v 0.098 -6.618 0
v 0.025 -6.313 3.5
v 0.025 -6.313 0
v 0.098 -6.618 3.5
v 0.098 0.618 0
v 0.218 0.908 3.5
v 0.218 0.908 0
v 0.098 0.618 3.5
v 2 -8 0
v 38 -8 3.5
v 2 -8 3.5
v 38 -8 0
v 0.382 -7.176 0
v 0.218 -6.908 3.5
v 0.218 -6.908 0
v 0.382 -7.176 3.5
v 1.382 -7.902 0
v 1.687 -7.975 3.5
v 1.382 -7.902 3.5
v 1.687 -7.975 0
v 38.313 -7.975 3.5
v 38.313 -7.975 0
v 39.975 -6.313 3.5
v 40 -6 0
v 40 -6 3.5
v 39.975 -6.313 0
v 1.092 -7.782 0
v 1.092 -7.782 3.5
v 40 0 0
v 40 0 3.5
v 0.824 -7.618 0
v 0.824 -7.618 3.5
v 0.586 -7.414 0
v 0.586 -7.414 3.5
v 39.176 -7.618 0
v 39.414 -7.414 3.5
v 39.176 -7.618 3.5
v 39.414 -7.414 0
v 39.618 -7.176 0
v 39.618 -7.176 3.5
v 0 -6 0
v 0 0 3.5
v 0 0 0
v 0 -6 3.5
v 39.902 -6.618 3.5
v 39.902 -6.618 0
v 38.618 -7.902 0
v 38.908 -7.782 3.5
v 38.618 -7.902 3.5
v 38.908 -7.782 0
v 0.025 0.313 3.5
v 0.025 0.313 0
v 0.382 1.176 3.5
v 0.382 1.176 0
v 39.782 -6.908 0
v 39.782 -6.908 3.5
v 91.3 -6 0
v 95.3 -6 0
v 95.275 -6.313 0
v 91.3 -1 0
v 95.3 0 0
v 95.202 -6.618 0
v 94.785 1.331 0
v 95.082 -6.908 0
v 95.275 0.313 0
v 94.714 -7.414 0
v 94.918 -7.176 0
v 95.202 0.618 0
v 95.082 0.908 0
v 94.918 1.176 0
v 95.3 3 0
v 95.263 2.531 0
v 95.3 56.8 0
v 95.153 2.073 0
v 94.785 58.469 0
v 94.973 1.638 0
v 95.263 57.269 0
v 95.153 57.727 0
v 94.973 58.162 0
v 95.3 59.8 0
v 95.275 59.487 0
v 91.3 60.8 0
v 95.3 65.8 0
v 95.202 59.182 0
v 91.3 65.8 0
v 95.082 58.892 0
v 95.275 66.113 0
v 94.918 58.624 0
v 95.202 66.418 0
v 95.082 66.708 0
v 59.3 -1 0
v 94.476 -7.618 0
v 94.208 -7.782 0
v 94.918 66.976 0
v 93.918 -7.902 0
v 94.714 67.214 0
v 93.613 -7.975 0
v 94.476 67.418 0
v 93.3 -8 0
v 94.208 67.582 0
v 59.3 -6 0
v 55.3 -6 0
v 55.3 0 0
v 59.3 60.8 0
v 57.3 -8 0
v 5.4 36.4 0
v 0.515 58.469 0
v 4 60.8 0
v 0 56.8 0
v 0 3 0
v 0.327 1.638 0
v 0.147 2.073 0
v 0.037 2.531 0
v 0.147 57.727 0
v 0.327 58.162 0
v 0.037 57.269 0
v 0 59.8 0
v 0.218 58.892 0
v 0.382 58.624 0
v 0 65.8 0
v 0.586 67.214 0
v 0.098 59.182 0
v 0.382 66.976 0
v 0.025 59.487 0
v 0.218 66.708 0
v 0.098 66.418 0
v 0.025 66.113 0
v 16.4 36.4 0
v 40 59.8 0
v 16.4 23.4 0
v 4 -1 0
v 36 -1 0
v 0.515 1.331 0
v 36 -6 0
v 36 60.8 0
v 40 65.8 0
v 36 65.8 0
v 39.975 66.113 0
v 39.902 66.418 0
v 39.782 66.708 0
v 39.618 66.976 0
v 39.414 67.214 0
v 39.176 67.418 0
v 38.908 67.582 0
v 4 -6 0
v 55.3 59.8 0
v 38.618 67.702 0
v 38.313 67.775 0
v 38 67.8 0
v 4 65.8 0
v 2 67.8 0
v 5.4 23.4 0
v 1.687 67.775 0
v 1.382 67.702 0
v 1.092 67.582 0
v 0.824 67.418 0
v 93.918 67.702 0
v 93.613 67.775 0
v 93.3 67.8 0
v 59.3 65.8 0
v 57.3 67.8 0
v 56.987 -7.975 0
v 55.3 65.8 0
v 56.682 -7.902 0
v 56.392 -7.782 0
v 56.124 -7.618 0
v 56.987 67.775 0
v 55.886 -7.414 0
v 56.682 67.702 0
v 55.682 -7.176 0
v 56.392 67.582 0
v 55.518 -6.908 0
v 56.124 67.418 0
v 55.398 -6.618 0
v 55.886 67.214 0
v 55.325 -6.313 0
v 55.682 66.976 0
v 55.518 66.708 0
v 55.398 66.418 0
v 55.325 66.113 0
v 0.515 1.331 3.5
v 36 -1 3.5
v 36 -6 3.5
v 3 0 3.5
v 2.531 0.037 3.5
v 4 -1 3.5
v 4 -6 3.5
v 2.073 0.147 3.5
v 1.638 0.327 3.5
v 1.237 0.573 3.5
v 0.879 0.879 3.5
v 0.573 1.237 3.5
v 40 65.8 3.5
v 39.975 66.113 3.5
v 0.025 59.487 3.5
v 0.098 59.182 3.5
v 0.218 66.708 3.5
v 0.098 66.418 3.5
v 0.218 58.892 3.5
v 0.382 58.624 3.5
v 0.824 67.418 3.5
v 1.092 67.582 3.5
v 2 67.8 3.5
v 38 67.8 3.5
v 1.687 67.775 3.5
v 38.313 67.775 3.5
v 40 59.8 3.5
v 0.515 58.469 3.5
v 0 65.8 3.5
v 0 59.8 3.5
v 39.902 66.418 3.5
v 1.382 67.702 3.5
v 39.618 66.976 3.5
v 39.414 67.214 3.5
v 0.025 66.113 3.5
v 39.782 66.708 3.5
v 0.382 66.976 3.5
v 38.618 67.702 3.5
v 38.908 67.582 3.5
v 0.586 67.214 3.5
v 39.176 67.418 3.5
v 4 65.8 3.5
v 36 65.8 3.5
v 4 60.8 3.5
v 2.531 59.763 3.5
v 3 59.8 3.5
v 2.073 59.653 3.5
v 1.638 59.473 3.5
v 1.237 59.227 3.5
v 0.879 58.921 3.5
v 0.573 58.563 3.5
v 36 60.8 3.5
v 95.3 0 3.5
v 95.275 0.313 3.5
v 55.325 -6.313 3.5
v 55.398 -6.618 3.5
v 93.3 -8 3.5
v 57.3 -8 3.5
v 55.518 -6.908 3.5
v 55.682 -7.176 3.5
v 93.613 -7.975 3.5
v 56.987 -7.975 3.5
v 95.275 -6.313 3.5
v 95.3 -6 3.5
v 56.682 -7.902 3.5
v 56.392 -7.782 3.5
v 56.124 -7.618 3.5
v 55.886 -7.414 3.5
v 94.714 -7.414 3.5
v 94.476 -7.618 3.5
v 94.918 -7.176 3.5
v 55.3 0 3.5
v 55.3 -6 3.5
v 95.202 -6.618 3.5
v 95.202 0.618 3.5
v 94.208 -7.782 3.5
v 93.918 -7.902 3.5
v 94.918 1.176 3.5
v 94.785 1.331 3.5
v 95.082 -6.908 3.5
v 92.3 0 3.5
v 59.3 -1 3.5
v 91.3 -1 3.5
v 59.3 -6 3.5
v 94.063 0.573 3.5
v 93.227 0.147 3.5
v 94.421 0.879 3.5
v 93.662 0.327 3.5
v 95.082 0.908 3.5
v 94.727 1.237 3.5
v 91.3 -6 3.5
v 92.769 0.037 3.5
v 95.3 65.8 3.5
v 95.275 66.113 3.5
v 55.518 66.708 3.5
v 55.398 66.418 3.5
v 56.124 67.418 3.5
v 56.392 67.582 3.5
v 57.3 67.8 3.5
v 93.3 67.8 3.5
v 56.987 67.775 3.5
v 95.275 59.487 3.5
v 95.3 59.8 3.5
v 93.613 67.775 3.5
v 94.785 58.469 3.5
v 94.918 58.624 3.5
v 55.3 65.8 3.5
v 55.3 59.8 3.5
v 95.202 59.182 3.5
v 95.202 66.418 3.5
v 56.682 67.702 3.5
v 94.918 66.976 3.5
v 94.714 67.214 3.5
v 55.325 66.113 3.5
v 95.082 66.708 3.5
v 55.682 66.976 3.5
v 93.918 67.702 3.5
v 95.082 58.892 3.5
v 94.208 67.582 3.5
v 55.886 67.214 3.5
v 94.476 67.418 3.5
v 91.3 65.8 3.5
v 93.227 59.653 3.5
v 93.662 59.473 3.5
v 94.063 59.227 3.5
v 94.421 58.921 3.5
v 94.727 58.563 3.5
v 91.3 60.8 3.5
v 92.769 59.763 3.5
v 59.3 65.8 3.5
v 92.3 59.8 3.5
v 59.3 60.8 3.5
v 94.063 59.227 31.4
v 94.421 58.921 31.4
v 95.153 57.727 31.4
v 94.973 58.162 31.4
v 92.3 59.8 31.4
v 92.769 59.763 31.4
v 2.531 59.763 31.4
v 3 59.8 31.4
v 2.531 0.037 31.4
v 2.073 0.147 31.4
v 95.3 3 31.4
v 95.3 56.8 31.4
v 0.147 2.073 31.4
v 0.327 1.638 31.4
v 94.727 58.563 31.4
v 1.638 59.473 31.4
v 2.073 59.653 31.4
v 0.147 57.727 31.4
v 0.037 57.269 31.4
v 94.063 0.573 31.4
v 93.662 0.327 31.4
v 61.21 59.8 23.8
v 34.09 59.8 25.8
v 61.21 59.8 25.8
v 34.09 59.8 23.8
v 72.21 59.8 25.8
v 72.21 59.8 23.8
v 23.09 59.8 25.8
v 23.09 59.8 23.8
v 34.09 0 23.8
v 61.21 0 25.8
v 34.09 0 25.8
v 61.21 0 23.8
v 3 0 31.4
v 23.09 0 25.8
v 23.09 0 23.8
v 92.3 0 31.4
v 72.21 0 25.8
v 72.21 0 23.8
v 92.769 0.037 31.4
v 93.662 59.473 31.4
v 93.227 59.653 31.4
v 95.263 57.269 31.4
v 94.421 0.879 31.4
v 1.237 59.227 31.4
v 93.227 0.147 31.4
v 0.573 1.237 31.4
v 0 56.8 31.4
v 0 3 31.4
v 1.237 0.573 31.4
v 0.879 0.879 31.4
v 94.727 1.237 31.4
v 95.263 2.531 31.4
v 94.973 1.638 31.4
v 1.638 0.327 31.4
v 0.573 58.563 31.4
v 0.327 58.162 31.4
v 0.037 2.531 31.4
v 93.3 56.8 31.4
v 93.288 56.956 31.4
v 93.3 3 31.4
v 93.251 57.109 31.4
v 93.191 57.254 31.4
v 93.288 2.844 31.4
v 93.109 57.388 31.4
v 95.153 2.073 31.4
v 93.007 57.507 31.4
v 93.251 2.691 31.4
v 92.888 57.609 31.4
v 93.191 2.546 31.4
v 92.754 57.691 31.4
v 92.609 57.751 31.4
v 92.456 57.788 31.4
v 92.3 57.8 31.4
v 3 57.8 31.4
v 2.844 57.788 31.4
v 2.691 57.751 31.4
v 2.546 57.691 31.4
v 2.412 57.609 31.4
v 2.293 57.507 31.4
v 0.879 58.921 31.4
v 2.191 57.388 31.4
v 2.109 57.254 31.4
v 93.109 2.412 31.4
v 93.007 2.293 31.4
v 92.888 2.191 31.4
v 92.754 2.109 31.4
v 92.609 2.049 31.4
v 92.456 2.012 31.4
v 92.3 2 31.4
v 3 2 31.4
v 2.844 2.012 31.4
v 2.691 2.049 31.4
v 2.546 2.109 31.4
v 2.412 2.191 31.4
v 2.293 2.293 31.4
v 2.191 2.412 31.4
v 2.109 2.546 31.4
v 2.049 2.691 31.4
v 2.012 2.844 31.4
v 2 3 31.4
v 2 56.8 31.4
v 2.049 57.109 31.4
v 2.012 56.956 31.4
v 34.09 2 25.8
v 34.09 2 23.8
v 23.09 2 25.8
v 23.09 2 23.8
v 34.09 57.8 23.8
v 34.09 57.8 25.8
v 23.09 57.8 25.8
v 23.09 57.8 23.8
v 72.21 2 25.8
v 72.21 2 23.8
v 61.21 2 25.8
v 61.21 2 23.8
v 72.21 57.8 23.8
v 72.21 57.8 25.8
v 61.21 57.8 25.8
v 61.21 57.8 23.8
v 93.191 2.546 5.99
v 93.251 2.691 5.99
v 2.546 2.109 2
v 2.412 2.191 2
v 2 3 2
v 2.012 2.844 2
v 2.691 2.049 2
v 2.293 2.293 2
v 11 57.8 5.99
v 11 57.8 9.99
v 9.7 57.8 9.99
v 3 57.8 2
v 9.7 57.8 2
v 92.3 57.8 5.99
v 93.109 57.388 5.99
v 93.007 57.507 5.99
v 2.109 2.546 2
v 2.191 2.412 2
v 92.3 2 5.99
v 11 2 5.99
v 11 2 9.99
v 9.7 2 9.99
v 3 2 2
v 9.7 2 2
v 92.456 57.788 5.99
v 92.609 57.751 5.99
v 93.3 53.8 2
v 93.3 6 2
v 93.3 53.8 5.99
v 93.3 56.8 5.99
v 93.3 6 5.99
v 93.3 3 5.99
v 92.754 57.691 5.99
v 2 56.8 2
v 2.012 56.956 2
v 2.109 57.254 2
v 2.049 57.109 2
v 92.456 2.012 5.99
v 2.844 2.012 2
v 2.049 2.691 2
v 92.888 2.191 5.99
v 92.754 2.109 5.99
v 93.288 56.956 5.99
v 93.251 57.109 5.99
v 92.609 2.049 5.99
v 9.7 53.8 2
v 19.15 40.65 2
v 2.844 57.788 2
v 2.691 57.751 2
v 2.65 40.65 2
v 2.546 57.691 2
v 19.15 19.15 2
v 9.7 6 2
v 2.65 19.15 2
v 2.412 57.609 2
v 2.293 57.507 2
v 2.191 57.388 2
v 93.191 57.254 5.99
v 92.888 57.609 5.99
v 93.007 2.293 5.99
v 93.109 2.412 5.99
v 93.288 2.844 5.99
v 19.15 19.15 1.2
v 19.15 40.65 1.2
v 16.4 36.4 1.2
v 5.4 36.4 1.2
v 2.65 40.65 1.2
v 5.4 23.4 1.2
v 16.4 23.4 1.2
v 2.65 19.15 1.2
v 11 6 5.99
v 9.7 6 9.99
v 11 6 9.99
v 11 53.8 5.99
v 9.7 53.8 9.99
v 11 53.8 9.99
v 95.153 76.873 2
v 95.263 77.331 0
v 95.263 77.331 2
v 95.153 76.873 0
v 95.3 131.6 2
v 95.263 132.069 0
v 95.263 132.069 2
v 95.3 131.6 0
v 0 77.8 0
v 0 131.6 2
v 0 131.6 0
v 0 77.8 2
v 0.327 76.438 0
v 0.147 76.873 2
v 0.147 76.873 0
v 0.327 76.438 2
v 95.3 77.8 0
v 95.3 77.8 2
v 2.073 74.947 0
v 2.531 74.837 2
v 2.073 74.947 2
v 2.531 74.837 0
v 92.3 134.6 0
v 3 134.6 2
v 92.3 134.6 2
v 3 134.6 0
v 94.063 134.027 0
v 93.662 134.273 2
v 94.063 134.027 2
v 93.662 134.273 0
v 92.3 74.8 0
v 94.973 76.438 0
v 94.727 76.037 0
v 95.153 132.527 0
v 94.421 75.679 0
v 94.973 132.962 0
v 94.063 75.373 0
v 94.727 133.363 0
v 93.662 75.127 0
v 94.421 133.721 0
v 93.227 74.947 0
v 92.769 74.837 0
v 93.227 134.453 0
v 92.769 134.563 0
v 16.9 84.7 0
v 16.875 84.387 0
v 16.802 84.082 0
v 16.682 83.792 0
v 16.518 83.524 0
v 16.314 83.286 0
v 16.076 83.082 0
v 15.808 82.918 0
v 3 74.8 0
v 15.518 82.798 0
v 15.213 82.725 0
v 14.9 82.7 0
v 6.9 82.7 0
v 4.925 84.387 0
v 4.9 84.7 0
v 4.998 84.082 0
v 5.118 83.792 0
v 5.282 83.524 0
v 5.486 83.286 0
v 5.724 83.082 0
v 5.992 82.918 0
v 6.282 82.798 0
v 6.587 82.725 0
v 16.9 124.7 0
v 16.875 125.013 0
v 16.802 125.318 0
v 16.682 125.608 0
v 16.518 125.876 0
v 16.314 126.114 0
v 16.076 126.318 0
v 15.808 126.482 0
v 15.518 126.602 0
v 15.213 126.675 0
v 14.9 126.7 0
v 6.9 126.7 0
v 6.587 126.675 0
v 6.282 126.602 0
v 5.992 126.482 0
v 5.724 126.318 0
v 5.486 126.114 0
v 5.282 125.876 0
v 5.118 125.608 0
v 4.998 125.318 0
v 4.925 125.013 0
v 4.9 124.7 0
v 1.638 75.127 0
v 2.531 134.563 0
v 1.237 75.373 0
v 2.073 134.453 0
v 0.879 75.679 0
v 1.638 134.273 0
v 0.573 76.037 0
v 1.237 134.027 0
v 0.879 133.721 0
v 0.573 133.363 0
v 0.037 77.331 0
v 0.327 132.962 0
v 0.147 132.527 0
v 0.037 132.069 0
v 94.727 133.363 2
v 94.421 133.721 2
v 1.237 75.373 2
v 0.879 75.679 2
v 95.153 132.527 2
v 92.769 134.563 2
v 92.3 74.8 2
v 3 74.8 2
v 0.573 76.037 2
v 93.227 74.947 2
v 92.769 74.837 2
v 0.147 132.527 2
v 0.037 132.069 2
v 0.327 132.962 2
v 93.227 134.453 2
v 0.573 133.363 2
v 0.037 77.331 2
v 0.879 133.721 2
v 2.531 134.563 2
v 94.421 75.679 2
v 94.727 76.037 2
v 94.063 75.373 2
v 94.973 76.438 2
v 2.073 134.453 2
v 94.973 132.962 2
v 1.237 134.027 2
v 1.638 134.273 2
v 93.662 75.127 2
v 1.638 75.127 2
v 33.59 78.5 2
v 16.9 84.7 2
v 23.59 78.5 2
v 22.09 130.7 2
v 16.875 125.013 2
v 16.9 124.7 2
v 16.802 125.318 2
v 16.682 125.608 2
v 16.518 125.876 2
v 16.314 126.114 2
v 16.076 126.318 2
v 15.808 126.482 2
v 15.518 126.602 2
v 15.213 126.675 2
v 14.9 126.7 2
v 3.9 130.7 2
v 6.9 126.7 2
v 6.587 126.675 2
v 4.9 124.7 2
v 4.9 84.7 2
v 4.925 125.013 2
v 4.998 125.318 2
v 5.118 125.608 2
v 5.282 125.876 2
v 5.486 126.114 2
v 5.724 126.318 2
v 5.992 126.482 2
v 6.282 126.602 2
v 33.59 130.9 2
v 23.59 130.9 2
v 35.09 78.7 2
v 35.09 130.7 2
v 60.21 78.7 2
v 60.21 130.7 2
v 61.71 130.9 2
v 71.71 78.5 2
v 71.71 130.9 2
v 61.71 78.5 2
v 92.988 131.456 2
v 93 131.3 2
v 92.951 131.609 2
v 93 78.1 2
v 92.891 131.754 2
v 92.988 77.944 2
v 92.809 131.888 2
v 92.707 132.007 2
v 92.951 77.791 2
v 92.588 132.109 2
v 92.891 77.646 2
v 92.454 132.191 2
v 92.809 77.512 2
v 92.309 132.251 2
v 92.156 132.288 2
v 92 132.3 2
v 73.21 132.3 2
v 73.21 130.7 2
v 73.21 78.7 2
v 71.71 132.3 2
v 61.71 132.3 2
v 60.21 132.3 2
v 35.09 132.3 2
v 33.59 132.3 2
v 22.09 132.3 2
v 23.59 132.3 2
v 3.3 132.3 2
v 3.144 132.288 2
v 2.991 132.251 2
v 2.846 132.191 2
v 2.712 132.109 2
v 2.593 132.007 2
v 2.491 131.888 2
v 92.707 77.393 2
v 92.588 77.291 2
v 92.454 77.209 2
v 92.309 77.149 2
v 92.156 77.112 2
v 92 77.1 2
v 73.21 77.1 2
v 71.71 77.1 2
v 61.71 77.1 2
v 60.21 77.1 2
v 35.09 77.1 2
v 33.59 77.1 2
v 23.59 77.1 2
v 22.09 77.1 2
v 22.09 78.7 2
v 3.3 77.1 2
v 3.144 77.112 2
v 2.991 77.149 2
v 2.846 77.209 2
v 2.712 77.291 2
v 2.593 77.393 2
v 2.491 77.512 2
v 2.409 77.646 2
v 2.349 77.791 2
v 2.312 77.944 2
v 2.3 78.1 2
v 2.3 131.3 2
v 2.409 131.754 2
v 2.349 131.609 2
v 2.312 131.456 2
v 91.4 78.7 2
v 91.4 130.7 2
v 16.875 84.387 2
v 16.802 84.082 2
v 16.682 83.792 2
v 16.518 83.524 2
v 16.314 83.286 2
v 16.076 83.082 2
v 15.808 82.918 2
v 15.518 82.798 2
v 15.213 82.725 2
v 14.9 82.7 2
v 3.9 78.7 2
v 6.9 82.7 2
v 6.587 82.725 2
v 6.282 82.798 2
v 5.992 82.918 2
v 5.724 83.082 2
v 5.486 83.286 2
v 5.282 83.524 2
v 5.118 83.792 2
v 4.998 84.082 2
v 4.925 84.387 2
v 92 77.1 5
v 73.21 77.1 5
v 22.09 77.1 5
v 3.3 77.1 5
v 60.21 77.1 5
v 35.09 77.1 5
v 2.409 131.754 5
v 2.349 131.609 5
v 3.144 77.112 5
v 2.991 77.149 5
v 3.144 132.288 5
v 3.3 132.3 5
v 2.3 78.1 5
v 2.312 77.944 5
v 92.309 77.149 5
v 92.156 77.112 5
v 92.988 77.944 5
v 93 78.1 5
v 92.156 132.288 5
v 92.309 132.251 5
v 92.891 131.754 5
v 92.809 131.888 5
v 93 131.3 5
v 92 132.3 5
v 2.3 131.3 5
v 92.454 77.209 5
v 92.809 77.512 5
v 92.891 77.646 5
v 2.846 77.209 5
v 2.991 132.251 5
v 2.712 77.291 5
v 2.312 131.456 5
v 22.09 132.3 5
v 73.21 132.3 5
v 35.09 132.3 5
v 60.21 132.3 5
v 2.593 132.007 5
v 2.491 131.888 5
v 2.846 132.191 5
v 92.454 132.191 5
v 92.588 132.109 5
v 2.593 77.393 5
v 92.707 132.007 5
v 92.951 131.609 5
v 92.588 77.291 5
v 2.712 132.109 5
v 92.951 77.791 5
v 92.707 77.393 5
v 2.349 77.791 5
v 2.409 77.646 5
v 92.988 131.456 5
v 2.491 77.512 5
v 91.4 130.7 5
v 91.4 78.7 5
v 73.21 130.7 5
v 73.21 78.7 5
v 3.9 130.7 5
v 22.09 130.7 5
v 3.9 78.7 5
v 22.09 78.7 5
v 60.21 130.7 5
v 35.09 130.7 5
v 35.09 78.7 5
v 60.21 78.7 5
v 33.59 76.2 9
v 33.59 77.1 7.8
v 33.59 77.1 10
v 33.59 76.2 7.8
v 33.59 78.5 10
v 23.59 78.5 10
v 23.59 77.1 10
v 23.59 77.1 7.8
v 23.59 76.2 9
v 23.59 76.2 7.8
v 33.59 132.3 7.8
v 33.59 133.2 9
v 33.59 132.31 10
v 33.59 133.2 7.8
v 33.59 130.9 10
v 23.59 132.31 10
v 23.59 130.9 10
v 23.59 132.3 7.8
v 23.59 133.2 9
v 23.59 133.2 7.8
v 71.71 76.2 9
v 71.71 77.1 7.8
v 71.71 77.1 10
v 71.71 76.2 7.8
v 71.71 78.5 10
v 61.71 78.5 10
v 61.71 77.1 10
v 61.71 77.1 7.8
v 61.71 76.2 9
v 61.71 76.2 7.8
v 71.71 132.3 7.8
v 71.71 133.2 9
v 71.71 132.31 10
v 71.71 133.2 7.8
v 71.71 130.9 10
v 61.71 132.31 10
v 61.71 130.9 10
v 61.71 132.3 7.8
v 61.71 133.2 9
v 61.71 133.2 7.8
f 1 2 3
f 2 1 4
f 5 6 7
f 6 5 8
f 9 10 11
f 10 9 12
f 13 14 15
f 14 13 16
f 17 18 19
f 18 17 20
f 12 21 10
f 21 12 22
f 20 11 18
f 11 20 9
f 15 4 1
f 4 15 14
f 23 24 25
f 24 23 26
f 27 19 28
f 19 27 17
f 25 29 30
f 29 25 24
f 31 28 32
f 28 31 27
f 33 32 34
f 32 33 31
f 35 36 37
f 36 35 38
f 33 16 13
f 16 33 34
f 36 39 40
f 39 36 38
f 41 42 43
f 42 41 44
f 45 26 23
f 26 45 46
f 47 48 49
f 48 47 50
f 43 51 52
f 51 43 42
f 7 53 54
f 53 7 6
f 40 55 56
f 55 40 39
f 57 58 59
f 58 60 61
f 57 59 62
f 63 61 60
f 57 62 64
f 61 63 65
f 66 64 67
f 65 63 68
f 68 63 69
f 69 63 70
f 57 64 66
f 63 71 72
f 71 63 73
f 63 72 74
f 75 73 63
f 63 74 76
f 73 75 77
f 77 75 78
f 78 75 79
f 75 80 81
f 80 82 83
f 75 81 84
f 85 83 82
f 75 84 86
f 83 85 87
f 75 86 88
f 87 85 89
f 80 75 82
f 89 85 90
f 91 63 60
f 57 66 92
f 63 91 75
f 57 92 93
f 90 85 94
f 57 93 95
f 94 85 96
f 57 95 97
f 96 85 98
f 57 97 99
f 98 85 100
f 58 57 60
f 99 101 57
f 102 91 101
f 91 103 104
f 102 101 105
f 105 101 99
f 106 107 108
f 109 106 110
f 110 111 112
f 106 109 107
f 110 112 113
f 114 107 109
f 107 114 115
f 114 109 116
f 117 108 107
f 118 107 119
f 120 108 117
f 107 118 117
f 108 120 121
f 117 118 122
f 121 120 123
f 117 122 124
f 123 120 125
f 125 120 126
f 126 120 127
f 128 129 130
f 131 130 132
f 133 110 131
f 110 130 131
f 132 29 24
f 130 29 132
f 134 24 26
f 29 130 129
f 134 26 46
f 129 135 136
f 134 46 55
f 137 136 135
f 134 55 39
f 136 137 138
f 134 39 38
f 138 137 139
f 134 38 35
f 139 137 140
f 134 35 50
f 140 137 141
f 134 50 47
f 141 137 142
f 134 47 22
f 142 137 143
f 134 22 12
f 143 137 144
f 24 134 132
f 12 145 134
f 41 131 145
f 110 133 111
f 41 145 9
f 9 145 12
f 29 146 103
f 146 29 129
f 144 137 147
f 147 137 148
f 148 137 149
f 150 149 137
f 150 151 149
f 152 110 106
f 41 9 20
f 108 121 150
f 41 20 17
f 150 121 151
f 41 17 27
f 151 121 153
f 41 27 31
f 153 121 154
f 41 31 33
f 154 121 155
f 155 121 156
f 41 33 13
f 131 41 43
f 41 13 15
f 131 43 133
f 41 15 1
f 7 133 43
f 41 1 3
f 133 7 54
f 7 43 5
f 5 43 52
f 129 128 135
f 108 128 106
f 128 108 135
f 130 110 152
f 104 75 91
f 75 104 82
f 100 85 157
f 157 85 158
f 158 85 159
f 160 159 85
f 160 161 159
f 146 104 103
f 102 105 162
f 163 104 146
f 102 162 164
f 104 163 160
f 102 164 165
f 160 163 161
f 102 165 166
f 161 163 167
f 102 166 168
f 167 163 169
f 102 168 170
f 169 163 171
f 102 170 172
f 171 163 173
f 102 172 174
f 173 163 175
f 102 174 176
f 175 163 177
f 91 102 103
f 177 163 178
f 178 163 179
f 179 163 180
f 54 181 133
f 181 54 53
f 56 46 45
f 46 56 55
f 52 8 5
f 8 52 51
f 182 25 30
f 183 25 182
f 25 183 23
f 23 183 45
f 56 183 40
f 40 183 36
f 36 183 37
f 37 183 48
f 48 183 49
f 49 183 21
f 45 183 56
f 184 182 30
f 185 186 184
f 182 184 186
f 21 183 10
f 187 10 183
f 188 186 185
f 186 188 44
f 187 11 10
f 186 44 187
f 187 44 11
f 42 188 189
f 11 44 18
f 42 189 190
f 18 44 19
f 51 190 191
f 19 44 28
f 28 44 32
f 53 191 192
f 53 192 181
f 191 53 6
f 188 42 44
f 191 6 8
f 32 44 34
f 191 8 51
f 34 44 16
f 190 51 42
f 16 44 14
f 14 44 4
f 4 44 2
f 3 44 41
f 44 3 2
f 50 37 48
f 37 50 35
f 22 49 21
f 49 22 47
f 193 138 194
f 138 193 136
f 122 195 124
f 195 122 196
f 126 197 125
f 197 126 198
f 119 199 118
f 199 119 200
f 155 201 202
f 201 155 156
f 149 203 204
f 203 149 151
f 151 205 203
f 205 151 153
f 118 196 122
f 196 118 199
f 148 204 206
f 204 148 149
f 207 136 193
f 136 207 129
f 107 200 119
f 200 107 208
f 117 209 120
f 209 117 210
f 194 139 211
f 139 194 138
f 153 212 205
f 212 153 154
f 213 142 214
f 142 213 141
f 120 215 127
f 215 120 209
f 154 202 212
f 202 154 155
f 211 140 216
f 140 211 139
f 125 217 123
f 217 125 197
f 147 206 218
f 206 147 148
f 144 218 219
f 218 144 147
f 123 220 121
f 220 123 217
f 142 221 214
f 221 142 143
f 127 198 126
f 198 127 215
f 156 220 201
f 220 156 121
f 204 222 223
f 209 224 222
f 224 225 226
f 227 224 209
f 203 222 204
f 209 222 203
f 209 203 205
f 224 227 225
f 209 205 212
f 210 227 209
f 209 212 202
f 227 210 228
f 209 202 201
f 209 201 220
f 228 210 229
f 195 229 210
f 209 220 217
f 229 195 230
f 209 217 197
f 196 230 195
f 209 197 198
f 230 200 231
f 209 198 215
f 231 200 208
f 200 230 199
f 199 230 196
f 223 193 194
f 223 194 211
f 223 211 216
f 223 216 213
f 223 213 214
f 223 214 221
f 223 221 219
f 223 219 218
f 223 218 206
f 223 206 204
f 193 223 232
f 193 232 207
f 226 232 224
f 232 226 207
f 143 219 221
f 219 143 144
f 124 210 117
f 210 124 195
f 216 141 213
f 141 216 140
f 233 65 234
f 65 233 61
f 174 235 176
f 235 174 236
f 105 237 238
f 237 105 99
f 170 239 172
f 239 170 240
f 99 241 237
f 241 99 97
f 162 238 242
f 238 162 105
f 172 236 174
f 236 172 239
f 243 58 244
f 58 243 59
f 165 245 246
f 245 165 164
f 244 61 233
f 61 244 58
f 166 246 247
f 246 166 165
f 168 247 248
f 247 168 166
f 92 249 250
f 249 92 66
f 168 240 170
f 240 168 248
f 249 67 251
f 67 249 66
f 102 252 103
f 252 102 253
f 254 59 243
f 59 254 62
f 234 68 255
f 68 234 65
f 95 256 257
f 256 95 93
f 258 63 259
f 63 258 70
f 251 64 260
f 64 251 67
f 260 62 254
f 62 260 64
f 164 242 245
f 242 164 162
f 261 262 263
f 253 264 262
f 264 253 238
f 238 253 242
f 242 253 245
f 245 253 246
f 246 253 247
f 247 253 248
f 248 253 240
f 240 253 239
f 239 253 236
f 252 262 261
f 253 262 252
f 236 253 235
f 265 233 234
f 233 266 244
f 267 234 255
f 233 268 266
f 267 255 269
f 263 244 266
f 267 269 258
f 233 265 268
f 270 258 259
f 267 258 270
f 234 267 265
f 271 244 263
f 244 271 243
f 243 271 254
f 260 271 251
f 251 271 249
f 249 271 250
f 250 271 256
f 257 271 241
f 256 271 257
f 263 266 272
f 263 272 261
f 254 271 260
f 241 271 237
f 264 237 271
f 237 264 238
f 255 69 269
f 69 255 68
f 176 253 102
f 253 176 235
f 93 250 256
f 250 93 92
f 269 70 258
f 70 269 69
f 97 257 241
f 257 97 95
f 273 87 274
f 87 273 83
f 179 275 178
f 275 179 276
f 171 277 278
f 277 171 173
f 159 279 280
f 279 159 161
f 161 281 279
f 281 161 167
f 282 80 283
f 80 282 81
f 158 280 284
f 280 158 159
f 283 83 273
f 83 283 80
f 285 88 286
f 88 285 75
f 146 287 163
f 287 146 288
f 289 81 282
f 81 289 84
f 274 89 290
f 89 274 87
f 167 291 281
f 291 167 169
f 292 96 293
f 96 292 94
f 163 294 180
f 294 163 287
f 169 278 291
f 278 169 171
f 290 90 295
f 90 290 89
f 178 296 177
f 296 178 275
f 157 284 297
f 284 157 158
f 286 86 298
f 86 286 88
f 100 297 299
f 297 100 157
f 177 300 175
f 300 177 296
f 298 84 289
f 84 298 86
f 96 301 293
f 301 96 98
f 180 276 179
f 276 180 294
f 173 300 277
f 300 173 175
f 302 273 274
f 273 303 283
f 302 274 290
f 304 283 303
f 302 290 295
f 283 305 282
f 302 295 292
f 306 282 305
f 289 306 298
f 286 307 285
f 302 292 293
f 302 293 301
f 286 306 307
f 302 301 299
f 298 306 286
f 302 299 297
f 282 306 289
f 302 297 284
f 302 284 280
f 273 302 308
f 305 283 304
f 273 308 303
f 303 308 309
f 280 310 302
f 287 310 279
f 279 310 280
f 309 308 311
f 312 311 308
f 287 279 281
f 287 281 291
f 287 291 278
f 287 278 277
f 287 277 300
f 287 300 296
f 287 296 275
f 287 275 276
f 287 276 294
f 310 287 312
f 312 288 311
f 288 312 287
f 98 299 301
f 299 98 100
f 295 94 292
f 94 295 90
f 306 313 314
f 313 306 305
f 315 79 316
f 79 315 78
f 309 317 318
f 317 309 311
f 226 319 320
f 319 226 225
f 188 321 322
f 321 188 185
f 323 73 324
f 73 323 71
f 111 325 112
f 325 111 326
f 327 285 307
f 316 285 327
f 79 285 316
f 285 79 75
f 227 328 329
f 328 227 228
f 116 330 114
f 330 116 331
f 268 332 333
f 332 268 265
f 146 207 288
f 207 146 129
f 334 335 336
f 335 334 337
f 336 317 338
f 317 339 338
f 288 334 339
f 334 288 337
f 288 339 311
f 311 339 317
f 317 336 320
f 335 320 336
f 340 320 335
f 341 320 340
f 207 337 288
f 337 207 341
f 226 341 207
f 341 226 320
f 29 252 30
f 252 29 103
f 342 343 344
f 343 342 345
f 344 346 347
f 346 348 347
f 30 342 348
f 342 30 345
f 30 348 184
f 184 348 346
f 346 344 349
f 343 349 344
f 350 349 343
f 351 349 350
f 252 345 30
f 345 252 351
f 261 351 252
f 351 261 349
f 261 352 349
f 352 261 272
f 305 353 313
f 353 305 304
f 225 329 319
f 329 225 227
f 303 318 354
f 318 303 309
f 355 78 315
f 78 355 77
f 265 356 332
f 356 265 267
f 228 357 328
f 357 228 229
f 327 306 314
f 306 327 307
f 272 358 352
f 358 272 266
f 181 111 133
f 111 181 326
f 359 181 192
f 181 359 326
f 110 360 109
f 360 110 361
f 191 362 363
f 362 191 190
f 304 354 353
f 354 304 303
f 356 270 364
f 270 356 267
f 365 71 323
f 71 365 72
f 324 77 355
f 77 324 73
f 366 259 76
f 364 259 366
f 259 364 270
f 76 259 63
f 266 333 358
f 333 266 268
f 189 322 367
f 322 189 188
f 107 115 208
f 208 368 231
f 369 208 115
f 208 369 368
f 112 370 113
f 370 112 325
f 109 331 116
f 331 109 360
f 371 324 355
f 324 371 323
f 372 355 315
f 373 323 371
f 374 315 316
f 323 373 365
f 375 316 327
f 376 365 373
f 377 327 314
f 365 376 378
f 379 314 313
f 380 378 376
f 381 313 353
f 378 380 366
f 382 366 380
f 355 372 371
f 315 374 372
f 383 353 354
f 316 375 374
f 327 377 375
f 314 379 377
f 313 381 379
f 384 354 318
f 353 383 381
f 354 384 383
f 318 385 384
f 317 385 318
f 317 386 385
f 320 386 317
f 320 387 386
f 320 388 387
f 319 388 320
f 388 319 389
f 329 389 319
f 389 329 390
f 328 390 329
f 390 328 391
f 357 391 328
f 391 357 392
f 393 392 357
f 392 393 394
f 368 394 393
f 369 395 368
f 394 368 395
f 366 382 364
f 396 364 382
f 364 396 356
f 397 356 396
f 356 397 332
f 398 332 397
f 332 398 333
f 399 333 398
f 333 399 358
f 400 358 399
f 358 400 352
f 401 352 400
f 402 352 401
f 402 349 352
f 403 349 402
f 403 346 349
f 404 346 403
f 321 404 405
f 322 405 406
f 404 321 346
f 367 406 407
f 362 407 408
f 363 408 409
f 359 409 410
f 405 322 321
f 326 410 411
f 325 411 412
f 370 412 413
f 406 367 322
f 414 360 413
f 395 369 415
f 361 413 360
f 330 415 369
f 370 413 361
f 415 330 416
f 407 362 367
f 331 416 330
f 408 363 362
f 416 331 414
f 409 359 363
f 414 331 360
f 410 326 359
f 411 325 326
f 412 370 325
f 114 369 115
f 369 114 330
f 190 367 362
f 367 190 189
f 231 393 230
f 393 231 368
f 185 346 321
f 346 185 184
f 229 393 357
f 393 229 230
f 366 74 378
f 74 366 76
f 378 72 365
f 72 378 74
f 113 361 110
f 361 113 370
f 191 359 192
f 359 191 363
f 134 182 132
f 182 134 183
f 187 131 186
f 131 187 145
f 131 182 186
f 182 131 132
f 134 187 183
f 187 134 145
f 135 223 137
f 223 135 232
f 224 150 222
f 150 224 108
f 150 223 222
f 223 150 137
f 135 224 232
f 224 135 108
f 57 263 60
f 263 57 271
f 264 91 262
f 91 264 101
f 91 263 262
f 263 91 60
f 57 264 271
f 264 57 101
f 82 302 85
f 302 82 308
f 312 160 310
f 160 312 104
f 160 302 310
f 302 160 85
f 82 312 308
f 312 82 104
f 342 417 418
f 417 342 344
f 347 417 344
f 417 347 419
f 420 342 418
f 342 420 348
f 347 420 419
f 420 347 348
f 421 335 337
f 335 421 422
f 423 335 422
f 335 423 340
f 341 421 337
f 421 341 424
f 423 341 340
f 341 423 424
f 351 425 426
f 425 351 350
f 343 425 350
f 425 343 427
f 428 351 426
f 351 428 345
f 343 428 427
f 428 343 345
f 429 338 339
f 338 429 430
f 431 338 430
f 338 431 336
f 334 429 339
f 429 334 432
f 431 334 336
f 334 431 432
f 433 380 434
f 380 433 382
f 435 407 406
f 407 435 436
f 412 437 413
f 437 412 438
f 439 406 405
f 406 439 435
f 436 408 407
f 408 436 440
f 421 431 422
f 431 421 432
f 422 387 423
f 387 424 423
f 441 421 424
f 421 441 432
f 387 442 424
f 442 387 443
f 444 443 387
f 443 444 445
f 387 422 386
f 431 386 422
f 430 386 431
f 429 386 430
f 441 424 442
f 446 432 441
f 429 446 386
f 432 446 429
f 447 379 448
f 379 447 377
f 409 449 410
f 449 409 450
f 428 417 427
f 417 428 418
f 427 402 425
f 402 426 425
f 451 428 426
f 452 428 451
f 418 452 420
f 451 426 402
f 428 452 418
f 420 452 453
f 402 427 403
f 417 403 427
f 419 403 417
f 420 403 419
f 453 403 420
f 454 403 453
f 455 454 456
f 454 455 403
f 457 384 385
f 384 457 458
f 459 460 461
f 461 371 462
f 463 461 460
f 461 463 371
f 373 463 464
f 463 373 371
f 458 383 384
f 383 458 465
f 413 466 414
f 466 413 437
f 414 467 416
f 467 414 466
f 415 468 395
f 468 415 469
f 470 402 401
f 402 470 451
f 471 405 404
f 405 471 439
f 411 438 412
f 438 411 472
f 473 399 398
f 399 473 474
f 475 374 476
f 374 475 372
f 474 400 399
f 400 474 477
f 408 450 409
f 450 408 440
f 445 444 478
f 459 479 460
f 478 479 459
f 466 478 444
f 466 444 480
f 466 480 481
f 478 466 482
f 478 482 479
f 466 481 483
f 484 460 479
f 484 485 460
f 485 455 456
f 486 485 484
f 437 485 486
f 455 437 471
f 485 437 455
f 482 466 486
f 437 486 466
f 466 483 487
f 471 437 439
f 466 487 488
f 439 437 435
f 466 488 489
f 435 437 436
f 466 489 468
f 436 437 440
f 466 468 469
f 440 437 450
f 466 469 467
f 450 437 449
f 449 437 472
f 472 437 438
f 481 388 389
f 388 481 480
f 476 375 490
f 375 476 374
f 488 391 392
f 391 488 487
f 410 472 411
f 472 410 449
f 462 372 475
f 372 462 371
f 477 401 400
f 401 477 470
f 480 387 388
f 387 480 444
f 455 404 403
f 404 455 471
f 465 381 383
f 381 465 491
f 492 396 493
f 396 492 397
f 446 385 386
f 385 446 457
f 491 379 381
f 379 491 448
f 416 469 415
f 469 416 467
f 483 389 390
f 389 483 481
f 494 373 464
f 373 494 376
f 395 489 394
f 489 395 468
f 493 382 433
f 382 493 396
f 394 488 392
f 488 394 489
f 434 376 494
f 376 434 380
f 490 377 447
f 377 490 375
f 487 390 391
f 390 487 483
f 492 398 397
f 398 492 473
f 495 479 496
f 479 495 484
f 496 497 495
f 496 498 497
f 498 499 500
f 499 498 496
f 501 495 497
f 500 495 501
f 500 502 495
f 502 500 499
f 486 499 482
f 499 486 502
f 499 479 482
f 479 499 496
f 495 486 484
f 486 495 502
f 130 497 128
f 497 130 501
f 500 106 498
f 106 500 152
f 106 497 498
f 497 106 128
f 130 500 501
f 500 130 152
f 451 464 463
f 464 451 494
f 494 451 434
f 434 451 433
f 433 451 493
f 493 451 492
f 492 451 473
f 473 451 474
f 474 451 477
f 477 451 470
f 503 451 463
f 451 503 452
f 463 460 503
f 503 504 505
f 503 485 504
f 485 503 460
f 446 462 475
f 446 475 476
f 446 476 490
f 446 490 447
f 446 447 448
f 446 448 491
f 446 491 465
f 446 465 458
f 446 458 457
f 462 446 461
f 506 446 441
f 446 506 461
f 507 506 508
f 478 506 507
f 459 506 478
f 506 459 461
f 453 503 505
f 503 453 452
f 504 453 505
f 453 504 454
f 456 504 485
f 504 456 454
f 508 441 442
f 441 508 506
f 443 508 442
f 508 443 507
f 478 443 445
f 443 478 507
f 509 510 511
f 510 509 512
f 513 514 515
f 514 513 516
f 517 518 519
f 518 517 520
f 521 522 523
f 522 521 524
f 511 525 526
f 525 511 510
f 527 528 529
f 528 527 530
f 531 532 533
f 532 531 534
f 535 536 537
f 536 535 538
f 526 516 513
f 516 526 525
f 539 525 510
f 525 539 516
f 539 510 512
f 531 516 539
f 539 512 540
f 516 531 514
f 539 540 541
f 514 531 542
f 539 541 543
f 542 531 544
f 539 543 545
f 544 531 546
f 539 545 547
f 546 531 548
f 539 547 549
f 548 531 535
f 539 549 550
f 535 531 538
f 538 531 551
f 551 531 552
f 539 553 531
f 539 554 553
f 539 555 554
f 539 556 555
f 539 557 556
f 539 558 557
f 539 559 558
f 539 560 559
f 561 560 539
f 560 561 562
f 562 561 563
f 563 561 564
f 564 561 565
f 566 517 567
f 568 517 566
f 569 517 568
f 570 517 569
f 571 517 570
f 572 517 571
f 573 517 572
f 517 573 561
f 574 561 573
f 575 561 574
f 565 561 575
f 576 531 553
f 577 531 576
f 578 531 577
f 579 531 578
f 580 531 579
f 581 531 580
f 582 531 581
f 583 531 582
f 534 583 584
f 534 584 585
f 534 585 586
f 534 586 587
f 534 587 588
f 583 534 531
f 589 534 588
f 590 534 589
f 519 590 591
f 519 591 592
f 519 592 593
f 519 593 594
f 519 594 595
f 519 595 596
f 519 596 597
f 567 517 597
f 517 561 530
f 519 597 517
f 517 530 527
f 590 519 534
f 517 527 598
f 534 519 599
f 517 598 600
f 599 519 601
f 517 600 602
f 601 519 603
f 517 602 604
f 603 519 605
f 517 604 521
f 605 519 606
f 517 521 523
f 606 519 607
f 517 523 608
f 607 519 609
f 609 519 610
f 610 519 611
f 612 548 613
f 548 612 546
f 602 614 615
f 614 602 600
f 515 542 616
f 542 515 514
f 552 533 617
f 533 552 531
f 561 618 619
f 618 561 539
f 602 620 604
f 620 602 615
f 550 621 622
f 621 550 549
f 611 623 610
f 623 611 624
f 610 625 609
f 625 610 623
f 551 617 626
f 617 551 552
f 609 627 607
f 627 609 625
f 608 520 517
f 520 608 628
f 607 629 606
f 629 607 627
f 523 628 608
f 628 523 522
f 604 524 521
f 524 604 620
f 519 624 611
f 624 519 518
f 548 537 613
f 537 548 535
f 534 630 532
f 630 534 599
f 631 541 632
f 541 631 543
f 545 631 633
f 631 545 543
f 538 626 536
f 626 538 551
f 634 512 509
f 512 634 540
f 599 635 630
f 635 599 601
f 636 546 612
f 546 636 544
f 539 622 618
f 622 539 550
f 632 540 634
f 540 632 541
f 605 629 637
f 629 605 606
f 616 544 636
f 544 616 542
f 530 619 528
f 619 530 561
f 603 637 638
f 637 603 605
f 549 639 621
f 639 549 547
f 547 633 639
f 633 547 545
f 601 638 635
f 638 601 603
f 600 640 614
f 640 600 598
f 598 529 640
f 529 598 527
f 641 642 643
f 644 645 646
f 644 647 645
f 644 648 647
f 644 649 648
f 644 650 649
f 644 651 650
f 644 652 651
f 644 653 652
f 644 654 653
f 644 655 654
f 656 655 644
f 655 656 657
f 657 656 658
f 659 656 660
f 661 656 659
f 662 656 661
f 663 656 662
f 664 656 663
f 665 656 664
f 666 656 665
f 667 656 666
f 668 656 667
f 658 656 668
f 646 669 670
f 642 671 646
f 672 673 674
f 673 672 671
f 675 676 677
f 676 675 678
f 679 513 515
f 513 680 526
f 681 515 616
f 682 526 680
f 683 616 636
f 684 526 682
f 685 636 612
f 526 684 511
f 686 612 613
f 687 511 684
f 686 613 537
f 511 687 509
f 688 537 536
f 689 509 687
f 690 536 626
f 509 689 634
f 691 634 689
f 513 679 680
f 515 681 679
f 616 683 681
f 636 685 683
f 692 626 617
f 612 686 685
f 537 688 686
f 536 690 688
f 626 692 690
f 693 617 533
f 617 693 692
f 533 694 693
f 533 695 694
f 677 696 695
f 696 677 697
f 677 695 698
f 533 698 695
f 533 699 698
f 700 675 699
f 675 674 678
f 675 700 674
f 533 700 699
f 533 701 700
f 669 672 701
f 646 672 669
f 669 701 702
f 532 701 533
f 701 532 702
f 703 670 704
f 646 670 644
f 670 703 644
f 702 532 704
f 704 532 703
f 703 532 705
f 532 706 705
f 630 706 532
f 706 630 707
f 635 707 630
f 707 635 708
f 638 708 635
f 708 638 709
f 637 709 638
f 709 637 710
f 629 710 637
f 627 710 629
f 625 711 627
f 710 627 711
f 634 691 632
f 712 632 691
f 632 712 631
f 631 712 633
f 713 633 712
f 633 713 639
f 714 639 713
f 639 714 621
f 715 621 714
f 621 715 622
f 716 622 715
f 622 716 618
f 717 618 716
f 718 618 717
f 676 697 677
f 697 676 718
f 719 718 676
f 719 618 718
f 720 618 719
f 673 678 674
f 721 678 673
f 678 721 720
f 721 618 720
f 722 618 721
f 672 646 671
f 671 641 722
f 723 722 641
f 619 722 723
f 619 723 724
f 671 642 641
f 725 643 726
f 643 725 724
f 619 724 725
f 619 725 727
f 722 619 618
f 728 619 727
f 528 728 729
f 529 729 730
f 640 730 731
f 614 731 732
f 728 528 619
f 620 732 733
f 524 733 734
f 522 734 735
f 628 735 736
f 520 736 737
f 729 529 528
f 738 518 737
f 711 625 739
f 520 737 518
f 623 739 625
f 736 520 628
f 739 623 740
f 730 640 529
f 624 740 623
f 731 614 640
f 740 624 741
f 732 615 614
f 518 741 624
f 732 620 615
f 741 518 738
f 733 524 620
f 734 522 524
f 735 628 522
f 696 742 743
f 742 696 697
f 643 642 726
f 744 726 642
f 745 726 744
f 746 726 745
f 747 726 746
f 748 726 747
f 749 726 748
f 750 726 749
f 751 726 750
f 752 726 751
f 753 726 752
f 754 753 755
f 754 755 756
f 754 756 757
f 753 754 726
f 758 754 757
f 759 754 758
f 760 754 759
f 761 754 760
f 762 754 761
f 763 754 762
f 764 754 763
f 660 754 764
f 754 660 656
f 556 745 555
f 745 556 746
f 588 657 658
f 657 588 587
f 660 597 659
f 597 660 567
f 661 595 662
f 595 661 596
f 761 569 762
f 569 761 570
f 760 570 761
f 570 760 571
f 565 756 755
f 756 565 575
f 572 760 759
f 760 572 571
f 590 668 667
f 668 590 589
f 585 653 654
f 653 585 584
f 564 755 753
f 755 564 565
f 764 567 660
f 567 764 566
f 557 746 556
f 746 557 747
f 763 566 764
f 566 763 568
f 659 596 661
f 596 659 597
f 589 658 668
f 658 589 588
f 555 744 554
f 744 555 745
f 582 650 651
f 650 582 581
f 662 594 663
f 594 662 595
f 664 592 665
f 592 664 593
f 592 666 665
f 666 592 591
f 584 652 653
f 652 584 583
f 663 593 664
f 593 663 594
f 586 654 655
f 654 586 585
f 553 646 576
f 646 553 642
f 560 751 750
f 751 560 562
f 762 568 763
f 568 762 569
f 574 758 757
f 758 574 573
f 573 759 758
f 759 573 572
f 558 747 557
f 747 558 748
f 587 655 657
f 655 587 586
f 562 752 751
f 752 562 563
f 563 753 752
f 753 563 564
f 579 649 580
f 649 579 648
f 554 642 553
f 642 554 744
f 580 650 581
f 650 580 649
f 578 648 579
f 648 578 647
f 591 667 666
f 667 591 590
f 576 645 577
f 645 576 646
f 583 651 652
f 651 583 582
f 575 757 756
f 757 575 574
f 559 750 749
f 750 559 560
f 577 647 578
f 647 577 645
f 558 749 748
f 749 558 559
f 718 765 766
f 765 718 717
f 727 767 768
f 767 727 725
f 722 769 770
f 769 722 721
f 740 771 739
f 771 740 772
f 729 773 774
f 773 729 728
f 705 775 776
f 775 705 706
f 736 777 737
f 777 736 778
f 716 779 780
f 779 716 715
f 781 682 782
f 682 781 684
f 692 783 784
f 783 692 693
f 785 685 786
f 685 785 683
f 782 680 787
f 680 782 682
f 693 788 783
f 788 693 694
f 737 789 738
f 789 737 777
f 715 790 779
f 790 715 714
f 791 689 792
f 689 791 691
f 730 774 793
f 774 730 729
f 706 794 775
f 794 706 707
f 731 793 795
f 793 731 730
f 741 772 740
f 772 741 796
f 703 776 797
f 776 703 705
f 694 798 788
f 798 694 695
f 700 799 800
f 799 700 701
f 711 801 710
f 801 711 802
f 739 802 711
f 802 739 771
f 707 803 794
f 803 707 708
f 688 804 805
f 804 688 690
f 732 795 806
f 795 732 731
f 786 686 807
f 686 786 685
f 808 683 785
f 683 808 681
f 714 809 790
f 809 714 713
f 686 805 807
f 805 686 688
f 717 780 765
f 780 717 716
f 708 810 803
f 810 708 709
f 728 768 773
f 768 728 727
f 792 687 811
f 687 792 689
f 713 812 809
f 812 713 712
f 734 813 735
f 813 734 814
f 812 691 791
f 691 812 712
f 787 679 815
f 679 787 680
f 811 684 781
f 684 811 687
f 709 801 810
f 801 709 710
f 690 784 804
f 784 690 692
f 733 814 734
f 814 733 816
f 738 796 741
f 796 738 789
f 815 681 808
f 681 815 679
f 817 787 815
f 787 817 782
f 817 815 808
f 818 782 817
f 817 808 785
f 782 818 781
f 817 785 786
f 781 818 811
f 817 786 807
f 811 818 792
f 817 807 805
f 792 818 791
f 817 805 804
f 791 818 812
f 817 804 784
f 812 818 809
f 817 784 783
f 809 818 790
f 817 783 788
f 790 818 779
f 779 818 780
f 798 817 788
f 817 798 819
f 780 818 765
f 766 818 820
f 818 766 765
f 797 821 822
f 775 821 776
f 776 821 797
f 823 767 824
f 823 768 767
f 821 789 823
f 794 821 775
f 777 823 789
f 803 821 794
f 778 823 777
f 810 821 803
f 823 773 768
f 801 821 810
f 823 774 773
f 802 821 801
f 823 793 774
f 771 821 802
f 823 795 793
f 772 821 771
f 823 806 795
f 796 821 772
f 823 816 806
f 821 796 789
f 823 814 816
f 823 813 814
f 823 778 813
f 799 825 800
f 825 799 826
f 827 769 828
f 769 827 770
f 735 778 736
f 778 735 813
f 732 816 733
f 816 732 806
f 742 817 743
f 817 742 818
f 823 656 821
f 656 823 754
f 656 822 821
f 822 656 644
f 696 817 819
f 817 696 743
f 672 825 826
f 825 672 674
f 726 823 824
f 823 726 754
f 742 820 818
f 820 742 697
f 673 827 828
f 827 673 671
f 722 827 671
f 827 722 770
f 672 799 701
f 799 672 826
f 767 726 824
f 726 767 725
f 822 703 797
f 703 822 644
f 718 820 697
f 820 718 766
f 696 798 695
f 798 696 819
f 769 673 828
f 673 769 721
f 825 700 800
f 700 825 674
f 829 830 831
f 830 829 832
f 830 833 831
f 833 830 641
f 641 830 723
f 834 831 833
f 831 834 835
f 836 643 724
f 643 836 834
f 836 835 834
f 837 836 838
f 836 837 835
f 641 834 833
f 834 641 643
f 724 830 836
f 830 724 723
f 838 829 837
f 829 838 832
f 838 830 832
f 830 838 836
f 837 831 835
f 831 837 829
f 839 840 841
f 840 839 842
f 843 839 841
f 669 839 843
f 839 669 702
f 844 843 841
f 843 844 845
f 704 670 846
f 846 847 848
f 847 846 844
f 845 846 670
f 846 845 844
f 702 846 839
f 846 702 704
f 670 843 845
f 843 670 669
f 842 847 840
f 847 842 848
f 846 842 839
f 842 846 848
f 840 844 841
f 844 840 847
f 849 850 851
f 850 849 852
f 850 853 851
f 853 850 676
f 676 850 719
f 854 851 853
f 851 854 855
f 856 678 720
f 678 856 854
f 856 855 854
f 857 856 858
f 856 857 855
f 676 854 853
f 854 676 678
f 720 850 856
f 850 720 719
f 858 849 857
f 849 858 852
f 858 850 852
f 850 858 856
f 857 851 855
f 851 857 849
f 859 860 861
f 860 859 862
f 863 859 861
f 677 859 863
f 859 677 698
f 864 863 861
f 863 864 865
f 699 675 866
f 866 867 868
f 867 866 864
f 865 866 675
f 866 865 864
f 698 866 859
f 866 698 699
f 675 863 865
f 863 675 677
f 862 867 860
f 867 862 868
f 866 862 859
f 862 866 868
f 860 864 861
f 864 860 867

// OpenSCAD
// ECE198: simple strap-on box for the breadboard (ESP32 build, no battery inside).
// x = along the arm, y = across the arm, z = up.
part = "both";            // "box", "lid", "assembled", "both"

bb_l = 82; bb_w = 55; bb_h = 9;   // breadboard
headroom = 25.4;                  // inside height measured from the bottom of the breadboard (~1 inch)
led_win_l = 12; led_win_w = 44;  // big LED viewing window in the lid, over the wire-channel end
hr_l = 21; hr_w = 16;             // MAX30102 breakout, faces down through the floor
hr_win_l = 13; hr_win_w = 11;     // skin window under the sensor chip
rail_h = 4;                       // breadboard sits on rails so the sensor and its wires fit underneath
wire_gap = 8.5;                   // channel along one short end wall for the sensor wires (wide enough to centre the sensor on the breadboard edge)
switch_hole = false; switch_d = 6.5;
strap_w = 30; tab = 8;

wall = 2; floor_t = 2; lid_t = 2; clr = 0.4; r = 3;
in_l = bb_l + 2*clr + wire_gap; in_w = bb_w + 2*clr;
out_l = in_l + 2*wall; out_w = in_w + 2*wall; out_h = floor_t + rail_h + headroom;
bb_x = wire_gap + clr;            // breadboard pushed to the far end, channel at the x = 0 end
strap_xs = [(strap_w + 10)/2, out_l - (strap_w + 10)/2];
$fn = 40;
echo(str("Body L x W x H: ", out_l, " x ", out_w, " x ", out_h + lid_t, "   width with strap tabs: ", out_w + 2*tab));

module rbox(l, w, h, rad) { hull() for (x = [rad, l-rad], y = [rad, w-rad]) translate([x, y, 0]) cylinder(r=rad, h=h); }

clip_w = 10; clip_drop = 8; clip_t = 1.4; hook = 0.9; win_h = 2.0; lc = 0.3;
clip_xs = [out_l*0.3, out_l*0.7];

module box() {
  difference() {
    union() {
      rbox(out_l, out_w, out_h, r);
      for (x = strap_xs, side = [0, 1]) translate([x - (strap_w + 10)/2, side ? out_w - 2 : -tab, 0]) rbox(strap_w + 10, tab + 2, 3.5, 2);
    }
    translate([wall, wall, floor_t]) rbox(in_l, in_w, out_h, 1);
    // heart rate sensor: recess + skin window centred on the breadboard's end edge (channel end) and across the width
    // (sensor turned so its 16 mm side runs along the box, straddling the breadboard's end edge)
    translate([wall + bb_x - (hr_w + 0.5)/2, wall + (in_w - hr_l - 0.5)/2, floor_t - 0.8]) cube([hr_w + 0.5, hr_l + 0.5, 2]);
    translate([wall + bb_x - hr_win_w/2, wall + (in_w - hr_win_l)/2, -1]) cube([hr_win_w, hr_win_l, 5]);
    for (x = strap_xs, side = [0, 1]) translate([x - (strap_w + 2)/2, side ? out_w + 1 : -tab + 2, -1]) cube([strap_w + 2, tab - 3, 6]);
    for (x = clip_xs, side = [0, 1])
      translate([x - (clip_w + 1)/2, side ? out_w - wall - 1 : -1, out_h - clip_drop + 0.4]) cube([clip_w + 1, wall + 2, win_h]);
  }
  // breadboard rails along both long walls (sensor wires run under the breadboard to the channel)
  for (y = [wall - 0.5, wall + in_w - 4]) translate([wall + bb_x, y, floor_t - 0.01]) cube([bb_l + clr + 0.5, 4.5, rail_h]);
  // stops that keep the breadboard out of the wire channel
  for (y = [wall - 0.5, wall + in_w - 4]) translate([wall + bb_x - 1.2, y, floor_t - 0.01]) cube([1.3, 4.5, rail_h + 4]);
}

module lid() {
  lip_h = 3; lip_t = 1.6;
  difference() {
    rbox(out_l, out_w, lid_t, r);
    // LED window centred over the breadboard's end edge at the channel end
    translate([wall + bb_x - led_win_l/2, (out_w - led_win_w)/2, -1]) rbox(led_win_l, led_win_w, lid_t + 2, 2);
    if (switch_hole) translate([out_l/2 + 10, out_w/2, -1]) cylinder(d=switch_d, h=lid_t + 2);
  }
  difference() {
    translate([wall + lc, wall + lc, lid_t]) difference() {
      rbox(in_l - 2*lc, in_w - 2*lc, lip_h, 1);
      translate([lip_t, lip_t, -1]) cube([in_l - 2*lc - 2*lip_t, in_w - 2*lc - 2*lip_t, lip_h + 2]);
    }
    for (x = clip_xs) translate([x - clip_w/2 - 1.5, -1, lid_t - 0.1]) cube([clip_w + 3, out_w + 2, lip_h + 1]);
  }
  for (x = clip_xs, side = [0, 1])
    translate([x - clip_w/2, side ? out_w - wall - lc - clip_t : wall + lc, lid_t]) clip(side);
}

module clip(side) {
  cube([clip_w, clip_t, clip_drop]);
  translate([0, side ? clip_t : 0, clip_drop - 2.2]) hull() {
    translate([0, side ? 0 : -hook, 0]) cube([clip_w, hook, 1.2]);
    translate([0, 0, 2.2 - 0.01]) cube([clip_w, 0.01, 0.01]);
  }
}

if (part == "box") box();
else if (part == "lid") lid();
else if (part == "assembled") { box(); translate([0, out_w, out_h + lid_t]) rotate([180, 0, 0]) lid(); }
else { box(); translate([0, out_w + 15, 0]) lid(); }
